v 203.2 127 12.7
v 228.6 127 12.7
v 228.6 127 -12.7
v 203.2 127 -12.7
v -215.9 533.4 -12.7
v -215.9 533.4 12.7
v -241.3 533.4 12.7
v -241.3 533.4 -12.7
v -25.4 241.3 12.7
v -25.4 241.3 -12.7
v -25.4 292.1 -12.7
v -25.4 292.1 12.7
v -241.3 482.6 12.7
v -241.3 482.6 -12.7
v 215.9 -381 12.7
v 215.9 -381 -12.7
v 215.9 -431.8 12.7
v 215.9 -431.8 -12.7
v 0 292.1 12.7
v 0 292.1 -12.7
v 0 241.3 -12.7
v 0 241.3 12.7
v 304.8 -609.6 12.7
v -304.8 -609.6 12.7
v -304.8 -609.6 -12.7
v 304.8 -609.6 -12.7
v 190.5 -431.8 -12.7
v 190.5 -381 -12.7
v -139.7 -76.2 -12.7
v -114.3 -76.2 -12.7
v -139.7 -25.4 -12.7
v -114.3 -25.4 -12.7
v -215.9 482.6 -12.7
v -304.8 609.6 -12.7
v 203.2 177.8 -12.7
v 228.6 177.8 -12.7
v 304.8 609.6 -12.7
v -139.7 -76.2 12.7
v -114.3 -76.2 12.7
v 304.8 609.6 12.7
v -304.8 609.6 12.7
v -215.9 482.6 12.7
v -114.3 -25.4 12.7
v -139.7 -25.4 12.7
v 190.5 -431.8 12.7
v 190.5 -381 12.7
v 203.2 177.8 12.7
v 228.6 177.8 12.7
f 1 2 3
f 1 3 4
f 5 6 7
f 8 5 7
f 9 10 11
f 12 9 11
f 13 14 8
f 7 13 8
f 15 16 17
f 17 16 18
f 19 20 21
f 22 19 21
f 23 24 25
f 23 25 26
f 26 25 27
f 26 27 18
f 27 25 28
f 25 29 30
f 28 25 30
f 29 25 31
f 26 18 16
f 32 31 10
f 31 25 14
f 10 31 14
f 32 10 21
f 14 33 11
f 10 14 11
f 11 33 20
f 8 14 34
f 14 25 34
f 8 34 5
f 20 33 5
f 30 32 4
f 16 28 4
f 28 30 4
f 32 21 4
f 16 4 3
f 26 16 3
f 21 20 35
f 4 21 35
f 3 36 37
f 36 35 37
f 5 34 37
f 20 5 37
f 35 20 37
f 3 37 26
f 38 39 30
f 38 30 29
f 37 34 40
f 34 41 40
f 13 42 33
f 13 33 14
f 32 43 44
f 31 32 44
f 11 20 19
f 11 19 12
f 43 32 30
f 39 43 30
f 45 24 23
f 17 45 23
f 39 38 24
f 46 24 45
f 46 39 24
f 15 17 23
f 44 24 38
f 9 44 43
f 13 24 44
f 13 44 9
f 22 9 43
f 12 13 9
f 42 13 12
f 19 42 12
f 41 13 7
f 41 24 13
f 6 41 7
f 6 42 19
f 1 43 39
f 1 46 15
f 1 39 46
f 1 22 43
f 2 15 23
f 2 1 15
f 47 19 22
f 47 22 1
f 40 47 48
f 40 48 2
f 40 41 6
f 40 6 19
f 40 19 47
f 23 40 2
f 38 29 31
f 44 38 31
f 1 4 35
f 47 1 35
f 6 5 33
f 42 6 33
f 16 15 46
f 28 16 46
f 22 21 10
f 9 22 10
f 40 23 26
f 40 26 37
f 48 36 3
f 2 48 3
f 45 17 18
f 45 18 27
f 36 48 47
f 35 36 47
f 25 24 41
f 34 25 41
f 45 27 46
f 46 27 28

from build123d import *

# Parameters (mm, degrees)
SKETCH1_W           = 609.6
SKETCH1_H           = 1219.2
BOSS_EXTRUDE1_DEPTH = 12.7
SKETCH2_W           = 25.4
SKETCH2_H           = 50.8
CUT_EXTRUDE1_DEPTH  = 683.026656371


with BuildPart() as part:
    # Sketch1 → Boss-Extrude1 (new, symmetric)
    with BuildSketch(Plane.XY):
        Rectangle(SKETCH1_W, SKETCH1_H)
    extrude(amount=BOSS_EXTRUDE1_DEPTH, both=True)

    # Sketch2 → Cut-Extrude1 (cut, through all)
    with BuildSketch(Plane(origin=(0, 0, -12.7), x_dir=(-1, 0, 0), z_dir=(0, 0, -1))):
        with Locations((-215.9, 152.4)):
            Rectangle(SKETCH2_W, SKETCH2_H)
        with Locations((12.7, 266.7)):
            Rectangle(SKETCH2_W, SKETCH2_H)
        with Locations((228.6, 508)):
            Rectangle(SKETCH2_W, SKETCH2_H)
        with Locations((127, -50.8)):
            Rectangle(SKETCH2_W, SKETCH2_H)
        with Locations((-203.2, -406.4)):
            Rectangle(SKETCH2_W, SKETCH2_H)
    extrude(amount=-CUT_EXTRUDE1_DEPTH, mode=Mode.SUBTRACT)


solid = part.part
